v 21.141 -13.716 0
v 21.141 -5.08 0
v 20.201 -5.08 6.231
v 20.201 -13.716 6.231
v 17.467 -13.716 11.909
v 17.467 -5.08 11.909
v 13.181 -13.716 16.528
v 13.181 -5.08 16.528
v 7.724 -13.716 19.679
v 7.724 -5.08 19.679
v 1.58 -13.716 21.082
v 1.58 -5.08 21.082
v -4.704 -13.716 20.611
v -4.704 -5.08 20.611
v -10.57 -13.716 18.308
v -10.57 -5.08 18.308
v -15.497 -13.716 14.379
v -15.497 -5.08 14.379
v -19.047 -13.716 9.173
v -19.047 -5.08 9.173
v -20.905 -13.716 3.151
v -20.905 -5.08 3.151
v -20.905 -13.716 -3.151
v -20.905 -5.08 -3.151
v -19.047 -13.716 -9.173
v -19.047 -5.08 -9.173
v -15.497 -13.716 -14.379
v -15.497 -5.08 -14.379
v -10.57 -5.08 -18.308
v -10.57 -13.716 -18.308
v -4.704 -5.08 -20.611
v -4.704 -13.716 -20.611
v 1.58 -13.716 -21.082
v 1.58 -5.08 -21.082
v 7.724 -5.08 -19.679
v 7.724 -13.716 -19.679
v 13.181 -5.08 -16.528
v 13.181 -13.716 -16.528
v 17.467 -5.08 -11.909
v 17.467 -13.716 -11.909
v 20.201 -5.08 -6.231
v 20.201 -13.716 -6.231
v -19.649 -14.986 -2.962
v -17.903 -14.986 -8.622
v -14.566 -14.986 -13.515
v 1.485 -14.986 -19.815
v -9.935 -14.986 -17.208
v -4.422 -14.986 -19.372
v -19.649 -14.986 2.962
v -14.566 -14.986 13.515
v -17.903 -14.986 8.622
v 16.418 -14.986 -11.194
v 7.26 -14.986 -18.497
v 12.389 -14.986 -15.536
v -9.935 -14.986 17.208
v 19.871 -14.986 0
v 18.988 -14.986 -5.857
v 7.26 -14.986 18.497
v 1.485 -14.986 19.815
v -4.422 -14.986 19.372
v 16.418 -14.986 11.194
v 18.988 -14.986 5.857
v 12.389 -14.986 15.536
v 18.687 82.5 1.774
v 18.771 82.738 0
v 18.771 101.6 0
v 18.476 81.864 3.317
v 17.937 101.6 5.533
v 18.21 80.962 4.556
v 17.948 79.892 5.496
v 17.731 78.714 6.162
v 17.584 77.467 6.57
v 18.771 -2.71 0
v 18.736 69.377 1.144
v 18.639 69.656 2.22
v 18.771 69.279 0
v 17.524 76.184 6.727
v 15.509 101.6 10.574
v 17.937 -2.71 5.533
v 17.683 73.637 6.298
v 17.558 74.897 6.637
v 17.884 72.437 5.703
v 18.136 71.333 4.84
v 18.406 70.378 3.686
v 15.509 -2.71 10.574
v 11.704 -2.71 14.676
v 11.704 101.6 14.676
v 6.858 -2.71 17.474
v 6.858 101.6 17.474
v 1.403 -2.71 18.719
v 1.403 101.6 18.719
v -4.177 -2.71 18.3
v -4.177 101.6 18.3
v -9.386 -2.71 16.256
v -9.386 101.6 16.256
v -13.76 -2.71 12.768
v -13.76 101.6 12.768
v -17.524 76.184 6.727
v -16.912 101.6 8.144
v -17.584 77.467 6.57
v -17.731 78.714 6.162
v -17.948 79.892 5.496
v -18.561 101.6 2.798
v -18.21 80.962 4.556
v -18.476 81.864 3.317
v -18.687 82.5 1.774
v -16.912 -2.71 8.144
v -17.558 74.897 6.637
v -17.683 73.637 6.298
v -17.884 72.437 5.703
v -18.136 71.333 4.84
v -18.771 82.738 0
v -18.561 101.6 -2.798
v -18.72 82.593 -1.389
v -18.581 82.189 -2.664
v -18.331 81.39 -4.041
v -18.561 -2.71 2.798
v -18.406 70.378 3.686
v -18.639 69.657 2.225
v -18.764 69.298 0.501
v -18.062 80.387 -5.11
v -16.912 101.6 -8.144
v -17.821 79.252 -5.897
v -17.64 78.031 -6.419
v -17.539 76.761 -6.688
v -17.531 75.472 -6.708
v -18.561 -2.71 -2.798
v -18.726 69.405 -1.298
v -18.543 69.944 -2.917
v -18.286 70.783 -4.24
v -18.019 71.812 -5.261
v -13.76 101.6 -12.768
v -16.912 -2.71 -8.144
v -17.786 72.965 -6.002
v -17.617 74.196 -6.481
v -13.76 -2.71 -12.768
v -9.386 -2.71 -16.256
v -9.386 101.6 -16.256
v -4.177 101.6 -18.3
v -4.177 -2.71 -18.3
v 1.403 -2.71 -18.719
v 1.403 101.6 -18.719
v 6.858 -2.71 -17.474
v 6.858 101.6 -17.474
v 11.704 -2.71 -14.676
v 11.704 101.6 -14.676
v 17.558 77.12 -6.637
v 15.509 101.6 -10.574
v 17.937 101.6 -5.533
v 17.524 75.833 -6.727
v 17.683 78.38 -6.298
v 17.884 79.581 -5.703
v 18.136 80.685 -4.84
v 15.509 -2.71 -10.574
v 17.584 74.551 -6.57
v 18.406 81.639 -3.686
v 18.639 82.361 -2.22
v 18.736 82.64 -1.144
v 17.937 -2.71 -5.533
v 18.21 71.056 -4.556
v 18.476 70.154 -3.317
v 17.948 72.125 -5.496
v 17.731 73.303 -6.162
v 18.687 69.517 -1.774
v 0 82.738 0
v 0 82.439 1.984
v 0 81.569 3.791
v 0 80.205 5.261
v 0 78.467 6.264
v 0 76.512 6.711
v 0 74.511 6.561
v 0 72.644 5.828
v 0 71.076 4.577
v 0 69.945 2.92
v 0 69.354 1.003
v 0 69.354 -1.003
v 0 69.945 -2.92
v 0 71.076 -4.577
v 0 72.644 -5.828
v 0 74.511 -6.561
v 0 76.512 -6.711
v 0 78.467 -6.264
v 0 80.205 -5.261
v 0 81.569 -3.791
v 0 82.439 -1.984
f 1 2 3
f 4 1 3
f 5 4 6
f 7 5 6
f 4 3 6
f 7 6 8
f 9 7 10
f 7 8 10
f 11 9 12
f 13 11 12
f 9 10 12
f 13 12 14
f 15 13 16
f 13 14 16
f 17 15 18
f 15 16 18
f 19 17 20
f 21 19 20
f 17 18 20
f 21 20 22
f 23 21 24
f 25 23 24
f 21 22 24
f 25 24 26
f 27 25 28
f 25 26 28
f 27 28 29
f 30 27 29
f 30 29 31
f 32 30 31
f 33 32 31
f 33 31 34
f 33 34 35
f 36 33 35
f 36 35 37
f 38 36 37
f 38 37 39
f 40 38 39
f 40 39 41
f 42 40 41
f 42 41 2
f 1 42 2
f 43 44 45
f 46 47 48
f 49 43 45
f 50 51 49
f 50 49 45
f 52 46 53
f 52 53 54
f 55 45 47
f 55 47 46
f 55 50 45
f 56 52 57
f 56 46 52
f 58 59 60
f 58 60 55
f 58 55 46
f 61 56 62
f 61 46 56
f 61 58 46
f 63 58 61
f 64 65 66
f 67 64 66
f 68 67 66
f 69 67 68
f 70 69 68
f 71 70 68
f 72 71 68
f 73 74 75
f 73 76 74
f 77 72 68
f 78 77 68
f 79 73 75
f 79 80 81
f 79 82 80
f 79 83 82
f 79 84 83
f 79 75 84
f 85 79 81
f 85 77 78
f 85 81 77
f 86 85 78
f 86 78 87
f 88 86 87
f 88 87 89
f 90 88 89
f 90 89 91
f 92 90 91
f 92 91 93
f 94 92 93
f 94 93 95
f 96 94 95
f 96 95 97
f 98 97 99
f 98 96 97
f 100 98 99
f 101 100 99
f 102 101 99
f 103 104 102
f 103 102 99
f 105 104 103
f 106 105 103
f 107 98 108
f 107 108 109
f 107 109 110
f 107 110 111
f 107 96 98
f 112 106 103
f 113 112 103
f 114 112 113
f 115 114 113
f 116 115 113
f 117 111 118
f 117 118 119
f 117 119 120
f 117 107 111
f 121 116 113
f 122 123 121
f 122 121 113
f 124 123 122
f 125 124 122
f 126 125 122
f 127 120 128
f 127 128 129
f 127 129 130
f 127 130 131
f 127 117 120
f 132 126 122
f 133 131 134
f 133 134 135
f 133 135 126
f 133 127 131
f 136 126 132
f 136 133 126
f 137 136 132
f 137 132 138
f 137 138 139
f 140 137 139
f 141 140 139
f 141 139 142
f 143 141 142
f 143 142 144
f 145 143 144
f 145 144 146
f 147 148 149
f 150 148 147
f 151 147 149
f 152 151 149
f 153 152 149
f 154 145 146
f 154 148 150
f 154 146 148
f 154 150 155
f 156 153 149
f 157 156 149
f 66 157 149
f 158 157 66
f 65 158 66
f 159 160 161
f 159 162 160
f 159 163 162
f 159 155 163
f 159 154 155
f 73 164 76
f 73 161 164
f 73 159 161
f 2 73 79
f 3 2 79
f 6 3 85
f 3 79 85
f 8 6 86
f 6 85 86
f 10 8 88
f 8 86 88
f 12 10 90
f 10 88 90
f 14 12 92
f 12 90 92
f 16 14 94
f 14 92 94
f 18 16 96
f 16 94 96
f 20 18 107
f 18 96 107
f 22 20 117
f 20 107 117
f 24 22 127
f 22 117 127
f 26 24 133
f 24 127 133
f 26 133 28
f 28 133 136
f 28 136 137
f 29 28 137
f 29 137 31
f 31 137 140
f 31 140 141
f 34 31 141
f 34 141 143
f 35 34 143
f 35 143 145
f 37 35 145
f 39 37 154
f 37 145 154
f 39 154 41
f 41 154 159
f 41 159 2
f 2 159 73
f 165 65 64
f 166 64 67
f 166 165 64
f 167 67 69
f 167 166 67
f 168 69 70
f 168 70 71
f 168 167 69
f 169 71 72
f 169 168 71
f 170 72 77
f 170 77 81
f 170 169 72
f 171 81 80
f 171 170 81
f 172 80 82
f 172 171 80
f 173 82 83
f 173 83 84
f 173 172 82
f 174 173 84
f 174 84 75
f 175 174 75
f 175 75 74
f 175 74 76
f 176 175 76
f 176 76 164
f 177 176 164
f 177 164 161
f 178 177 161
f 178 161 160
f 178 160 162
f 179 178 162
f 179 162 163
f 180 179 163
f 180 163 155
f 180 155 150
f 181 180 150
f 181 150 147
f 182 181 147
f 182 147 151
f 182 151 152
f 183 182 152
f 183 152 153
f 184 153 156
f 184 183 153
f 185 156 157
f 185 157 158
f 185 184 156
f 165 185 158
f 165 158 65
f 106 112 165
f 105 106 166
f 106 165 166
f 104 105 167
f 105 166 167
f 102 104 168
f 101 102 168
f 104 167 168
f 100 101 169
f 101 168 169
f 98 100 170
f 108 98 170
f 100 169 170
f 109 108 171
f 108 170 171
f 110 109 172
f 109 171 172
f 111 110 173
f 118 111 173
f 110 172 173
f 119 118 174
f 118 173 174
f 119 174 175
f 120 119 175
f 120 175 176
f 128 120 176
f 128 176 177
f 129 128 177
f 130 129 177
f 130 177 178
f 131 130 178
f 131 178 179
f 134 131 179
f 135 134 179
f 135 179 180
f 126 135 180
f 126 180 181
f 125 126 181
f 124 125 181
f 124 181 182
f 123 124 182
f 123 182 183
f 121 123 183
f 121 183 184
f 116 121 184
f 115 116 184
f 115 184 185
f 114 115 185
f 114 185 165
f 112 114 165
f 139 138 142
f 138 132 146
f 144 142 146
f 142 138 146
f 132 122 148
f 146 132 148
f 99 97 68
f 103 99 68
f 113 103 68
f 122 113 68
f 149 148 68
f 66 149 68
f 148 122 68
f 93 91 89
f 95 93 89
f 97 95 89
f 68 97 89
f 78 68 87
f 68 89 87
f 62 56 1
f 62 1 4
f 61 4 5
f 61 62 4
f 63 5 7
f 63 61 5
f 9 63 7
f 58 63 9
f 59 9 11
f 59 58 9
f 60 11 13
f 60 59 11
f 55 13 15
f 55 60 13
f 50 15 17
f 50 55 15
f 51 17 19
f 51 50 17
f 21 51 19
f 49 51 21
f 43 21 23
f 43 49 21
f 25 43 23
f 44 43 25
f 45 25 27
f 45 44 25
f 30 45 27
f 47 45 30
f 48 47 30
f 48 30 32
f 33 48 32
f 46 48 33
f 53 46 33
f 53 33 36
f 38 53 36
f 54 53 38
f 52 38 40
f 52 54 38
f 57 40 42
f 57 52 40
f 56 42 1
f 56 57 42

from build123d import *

# Parameters (mm, degrees)
F0_R          = 18.7710767317
F1_DEPTH      = 101.6
F2_R          = 21.1406607176
F3_DEPTH      = 14.986
F4_S5_R       = 18.7710767317
F4_T6_DEPTH   = 32
F5_SIZE2      = 1.27
F5_SIZE       = 1.27
F6_R          = 6.7296542148
F7_DEPTH      = 47.498
F7_DEPTH_BACK = 25.4


# Not quite as in the source:
# - a fillet or chamfer that OpenCascade refuses, or shapes differently, is made with other operations: its cross-section is extruded or revolved along the edge and cut away or added


with BuildPart() as f1:
    # F0 (on Front) → F1 (new body)
    with BuildSketch(Plane.XZ):
        Circle(F0_R)
    extrude(amount=-F1_DEPTH)

    # F2 (on Front) → F3 (join)
    with BuildSketch(Plane.XZ):
        Circle(F2_R)
    extrude(amount=F3_DEPTH)

    # F4: chamfer of 5.08 on 1 edges, made by hand


with BuildPart() as f4_tool2:
    # F4_s3 → F4_t4 (revolve)
    with BuildSketch(Plane.XY):
        Polygon((21.1406607176, -5.08), (16.0606607176, 0), (21.1406607176, 0), align=None)
    revolve(axis=Axis((0, 0, 0), (0, -1, 0)))

    # F4_s5 → F4_t6 (cut, symmetric)
    with BuildSketch(Plane.XZ.offset(2.5)):
        Circle(F4_S5_R)
    extrude(amount=F4_T6_DEPTH, both=True, mode=Mode.SUBTRACT)


with BuildPart() as f1_1:
    add(f1.part)

    # F4_t1: cut F4_tool2
    add(f4_tool2.part, mode=Mode.SUBTRACT)

    # F5
    f5_edges = [f1_1.edges().sort_by_distance(p)[0] for p in [
        (-21.140661, -14.986, 0),
    ]]
    chamfer(f5_edges, length=F5_SIZE, length2=F5_SIZE2)

    # F6 (on Right) → F7 (cut, two sides)
    with BuildSketch(Plane.YZ) as f7_sk:
        with Locations((76.0086998343, 0)):
            Circle(F6_R)
    extrude(amount=F7_DEPTH, mode=Mode.SUBTRACT)
    extrude(f7_sk.sketch, amount=-F7_DEPTH_BACK, mode=Mode.SUBTRACT)


solid = f1_1.part
